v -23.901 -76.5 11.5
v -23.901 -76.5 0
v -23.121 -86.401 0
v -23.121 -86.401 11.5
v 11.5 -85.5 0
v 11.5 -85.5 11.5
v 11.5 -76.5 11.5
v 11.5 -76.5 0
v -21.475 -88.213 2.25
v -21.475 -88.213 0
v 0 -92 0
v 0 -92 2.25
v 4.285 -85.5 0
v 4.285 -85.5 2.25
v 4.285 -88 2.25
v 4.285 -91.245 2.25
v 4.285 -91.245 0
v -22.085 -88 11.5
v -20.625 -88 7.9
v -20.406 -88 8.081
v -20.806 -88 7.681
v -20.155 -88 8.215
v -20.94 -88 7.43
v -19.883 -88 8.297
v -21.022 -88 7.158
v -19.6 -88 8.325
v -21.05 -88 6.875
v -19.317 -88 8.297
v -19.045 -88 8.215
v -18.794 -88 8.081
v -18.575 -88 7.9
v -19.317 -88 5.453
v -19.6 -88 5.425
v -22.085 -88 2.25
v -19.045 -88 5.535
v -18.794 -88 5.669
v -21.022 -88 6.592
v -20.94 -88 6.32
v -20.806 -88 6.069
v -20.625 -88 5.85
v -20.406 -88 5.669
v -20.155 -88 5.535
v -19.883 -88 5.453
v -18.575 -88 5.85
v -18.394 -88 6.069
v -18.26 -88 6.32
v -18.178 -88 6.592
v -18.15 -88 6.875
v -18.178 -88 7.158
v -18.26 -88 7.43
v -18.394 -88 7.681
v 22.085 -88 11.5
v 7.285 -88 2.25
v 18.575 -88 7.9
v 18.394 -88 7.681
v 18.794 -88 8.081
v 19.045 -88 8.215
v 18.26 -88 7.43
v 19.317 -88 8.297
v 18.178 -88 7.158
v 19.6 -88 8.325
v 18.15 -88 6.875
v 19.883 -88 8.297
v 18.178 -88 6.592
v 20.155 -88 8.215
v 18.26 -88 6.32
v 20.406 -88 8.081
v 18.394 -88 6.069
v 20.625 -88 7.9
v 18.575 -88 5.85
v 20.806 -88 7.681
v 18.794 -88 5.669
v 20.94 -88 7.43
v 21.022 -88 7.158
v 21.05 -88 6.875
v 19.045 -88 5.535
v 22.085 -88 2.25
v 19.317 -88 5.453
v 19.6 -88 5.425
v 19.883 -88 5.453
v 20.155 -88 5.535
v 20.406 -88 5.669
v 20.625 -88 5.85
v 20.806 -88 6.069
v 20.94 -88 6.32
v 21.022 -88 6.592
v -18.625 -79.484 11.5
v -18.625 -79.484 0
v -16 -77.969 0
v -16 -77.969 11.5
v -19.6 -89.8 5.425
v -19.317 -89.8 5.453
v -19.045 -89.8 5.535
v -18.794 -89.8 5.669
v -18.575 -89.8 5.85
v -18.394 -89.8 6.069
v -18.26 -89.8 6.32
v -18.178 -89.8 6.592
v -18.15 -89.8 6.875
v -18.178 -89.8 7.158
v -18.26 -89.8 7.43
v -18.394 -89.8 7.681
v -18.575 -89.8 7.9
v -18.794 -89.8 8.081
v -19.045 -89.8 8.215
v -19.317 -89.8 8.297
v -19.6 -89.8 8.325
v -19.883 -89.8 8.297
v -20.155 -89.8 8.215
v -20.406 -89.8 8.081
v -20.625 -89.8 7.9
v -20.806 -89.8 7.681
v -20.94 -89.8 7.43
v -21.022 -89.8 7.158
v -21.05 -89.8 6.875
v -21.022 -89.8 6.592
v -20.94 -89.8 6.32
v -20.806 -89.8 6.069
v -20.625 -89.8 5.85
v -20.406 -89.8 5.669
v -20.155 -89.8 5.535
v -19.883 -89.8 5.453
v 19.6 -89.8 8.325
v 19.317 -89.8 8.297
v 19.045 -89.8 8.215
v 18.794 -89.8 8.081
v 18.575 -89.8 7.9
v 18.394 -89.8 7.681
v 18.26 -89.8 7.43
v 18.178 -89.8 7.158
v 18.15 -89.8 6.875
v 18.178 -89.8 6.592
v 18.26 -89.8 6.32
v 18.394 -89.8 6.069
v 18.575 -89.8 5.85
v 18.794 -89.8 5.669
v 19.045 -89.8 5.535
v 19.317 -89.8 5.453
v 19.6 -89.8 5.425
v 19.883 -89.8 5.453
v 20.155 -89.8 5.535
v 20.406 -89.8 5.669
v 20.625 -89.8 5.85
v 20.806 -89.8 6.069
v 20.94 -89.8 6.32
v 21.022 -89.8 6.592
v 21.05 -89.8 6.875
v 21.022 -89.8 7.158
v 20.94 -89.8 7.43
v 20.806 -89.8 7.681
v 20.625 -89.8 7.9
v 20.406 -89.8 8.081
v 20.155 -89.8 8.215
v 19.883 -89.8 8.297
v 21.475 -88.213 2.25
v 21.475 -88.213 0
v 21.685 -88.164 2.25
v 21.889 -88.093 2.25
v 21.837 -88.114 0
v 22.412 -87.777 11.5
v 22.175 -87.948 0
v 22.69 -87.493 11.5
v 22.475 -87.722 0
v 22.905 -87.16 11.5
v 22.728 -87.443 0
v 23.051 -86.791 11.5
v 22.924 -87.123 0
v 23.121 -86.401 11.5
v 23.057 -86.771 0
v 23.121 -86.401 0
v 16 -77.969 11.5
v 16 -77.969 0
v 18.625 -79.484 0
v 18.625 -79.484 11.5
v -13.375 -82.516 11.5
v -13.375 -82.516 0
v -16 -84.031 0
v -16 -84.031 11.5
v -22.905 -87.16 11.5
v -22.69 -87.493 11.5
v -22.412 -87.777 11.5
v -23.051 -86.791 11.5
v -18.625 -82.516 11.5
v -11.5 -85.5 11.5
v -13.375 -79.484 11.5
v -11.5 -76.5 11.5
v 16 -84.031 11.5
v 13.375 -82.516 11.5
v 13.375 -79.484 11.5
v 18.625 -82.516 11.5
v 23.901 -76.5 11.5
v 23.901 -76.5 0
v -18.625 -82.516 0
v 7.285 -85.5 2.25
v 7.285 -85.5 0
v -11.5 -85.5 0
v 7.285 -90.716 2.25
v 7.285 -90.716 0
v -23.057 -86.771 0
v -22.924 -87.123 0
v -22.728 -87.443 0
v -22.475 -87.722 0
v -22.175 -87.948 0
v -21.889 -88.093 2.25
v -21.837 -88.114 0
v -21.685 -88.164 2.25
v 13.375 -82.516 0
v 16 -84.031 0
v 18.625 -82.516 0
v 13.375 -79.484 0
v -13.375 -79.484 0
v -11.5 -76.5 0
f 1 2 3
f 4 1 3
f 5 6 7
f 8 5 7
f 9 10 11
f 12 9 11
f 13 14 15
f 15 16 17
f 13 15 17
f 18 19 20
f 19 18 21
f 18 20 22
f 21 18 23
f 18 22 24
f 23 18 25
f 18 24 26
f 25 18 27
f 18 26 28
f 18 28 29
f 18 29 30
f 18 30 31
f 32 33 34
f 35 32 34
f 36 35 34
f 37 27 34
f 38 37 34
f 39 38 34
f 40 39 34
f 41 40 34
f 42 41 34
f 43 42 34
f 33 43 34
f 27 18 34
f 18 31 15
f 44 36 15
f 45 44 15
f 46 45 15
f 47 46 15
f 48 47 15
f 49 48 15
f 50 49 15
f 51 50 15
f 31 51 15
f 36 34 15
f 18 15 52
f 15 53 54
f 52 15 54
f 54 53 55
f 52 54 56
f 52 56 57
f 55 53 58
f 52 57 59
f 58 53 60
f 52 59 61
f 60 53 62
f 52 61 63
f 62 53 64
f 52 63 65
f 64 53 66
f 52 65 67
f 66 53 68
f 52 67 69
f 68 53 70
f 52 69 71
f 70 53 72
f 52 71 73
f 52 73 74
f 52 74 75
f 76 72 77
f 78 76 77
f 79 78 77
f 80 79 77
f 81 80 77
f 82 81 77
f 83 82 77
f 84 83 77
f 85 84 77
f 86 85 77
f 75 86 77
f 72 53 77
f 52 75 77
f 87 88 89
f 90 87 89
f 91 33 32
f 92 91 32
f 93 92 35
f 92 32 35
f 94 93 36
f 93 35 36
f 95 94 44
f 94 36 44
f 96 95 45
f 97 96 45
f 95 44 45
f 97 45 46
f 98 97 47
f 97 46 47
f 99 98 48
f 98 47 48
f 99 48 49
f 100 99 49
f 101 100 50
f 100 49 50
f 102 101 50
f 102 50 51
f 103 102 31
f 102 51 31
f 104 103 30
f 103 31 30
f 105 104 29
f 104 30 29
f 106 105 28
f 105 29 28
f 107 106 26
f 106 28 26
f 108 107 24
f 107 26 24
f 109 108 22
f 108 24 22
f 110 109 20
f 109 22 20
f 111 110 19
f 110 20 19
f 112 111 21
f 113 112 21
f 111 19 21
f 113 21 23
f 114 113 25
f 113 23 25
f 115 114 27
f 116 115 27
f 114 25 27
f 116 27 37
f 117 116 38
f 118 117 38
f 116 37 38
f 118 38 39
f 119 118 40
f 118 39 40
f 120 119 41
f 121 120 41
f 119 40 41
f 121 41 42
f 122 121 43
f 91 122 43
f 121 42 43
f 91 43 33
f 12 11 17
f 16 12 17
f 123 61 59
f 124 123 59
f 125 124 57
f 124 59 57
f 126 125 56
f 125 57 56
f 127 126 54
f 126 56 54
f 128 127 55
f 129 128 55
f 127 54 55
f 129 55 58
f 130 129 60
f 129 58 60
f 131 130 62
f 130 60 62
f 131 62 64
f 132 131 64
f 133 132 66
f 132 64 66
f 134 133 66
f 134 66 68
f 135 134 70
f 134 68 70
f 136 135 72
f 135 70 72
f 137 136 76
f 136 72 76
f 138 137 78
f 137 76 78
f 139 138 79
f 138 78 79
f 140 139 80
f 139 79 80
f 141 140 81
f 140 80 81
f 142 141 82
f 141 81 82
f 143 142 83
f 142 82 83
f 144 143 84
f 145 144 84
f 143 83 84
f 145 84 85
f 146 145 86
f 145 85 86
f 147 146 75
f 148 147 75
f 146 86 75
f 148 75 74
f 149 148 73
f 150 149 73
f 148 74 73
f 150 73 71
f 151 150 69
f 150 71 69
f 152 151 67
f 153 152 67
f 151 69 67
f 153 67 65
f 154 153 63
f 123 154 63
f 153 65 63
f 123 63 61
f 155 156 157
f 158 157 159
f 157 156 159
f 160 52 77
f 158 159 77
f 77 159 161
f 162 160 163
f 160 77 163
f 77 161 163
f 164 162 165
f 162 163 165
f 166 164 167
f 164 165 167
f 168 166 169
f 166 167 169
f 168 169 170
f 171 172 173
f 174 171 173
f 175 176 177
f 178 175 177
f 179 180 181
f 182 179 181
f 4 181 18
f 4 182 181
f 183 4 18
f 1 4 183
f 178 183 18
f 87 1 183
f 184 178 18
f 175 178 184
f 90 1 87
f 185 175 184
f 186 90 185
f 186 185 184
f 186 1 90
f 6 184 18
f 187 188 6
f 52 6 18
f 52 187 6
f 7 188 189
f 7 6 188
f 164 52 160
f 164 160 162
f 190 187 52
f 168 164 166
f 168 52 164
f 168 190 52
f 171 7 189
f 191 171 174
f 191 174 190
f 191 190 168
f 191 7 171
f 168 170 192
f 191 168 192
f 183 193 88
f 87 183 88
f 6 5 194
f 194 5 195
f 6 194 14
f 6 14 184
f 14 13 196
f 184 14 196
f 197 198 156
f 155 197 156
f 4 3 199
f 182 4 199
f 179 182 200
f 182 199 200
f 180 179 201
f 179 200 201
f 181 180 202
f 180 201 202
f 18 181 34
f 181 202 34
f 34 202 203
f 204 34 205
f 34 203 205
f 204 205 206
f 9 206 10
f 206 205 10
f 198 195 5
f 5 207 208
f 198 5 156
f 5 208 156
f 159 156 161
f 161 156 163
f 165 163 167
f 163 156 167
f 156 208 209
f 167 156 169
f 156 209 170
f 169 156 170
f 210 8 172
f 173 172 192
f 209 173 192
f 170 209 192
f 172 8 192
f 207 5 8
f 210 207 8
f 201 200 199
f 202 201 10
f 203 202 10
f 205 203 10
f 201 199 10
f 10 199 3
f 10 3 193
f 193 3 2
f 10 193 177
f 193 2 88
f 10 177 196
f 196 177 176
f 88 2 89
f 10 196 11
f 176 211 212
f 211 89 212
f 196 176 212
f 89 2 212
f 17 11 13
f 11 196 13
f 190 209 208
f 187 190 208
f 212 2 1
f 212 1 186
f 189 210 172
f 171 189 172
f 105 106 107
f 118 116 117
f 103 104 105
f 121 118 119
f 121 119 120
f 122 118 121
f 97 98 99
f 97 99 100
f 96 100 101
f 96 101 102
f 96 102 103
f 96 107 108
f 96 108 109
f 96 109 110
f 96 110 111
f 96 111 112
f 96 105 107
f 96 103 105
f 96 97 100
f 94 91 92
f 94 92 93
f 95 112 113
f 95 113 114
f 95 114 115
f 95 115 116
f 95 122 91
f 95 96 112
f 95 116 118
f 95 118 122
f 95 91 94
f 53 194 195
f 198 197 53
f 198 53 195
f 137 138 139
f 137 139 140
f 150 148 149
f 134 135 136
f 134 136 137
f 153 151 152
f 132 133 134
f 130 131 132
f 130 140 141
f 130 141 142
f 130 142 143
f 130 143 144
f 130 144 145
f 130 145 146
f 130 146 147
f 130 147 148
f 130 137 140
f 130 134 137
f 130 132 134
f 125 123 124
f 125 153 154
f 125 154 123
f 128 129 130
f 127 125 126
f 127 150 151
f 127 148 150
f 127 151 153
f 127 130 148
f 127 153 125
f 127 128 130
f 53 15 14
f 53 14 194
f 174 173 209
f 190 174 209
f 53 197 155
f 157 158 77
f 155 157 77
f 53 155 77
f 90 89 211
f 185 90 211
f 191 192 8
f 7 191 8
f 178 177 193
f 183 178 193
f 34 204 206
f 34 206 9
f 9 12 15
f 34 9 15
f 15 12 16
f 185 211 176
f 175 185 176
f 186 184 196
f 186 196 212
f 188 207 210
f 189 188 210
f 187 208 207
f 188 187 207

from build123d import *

# Parameters (mm, degrees)
SKETCH1_W           = 9
SKETCH1_H           = 9
BOSS_EXTRUDE1_DEPTH = 11.5
SKETCH2_W           = 45.5
SKETCH2_H           = 9.25
CUT_EXTRUDE1_DEPTH  = 4
SKETCH3_R           = 1.45
BOSS_EXTRUDE2_DEPTH = 1.8
CUT_EXTRUDE2_REACH  = 32.72
SKETCH4_W           = 3
SKETCH4_H           = 2.25


with BuildPart() as part:
    # Sketch1 → Boss-Extrude1 (new body)
    # profile 1 of 4: a face of its own
    with BuildSketch(Plane.XY):
        with BuildLine():
            Line((-20.5, -76.5), (-23.900700066, -76.5))
            Line((-23.900700066, -76.5), (-23.121499045, -86.400687699))
            ThreePointArc((-23.121499045, -86.400687699), (-22.608100633, -87.588503122), (-21.474960733, -88.213385013))
            Line((-21.474960733, -88.213385013), (0, -92))
            Line((0, -92), (21.474960733, -88.213385013))
            ThreePointArc((21.474960733, -88.213385013), (22.608100633, -87.588503122), (23.121499045, -86.400687699))
            Line((23.121499045, -86.400687699), (23.900700066, -76.5))
            Line((23.900700066, -76.5), (20.5, -76.5))
            Line((20.5, -76.5), (20.5, -85.5))
            Line((20.5, -85.5), (11.5, -85.5))
            Line((11.5, -85.5), (-11.5, -85.5))
            Line((-11.5, -85.5), (-20.5, -85.5))
            Line((-20.5, -85.5), (-20.5, -76.5))
        make_face()
    # profile 2 of 4: a face of its own
    with BuildSketch(Plane.XY):
        with BuildLine():
            Line((-20.5, -76.5), (-23.900700066, -76.5))
            Line((-23.900700066, -76.5), (-23.121499045, -86.400687699))
            ThreePointArc((-23.121499045, -86.400687699), (-22.608100633, -87.588503122), (-21.474960733, -88.213385013))
            Line((-21.474960733, -88.213385013), (0, -92))
            Line((0, -92), (21.474960733, -88.213385013))
            ThreePointArc((21.474960733, -88.213385013), (22.608100633, -87.588503122), (23.121499045, -86.400687699))
            Line((23.121499045, -86.400687699), (23.900700066, -76.5))
            Line((23.900700066, -76.5), (20.5, -76.5))
            Line((20.5, -76.5), (20.5, -85.5))
            Line((20.5, -85.5), (11.5, -85.5))
            Line((11.5, -85.5), (-11.5, -85.5))
            Line((-11.5, -85.5), (-20.5, -85.5))
            Line((-20.5, -85.5), (-20.5, -76.5))
        make_face()
    # profile 3 of 4: a face of its own
    with BuildSketch(Plane.XY):
        with Locations((16, -81)):
            Rectangle(SKETCH1_W, SKETCH1_H)
        Polygon((18.625, -82.515544457), (16, -84.031088913), (13.375, -82.515544457), (13.375, -79.484455543), (16, -77.968911087), (18.625, -79.484455543), align=None, mode=Mode.SUBTRACT)
    # profile 4 of 4: a face of its own
    with BuildSketch(Plane.XY):
        with Locations((-16, -81)):
            Rectangle(SKETCH1_W, SKETCH1_H)
        Polygon((-13.375, -82.515544457), (-16, -84.031088913), (-18.625, -82.515544457), (-18.625, -79.484455543), (-16, -77.968911087), (-13.375, -79.484455543), align=None, mode=Mode.SUBTRACT)
    extrude(amount=BOSS_EXTRUDE1_DEPTH)

    # Sketch2 → Cut-Extrude1 (cut)
    with BuildSketch(Plane(origin=(0, -92, 0), x_dir=(1, 0, 0), z_dir=(0, 1, 0))):
        with Locations((0, -6.875)):
            Rectangle(SKETCH2_W, SKETCH2_H)
    extrude(amount=CUT_EXTRUDE1_DEPTH, mode=Mode.SUBTRACT)

    # Sketch3 → Boss-Extrude2 (add)
    with BuildSketch(Plane.XZ.offset(88)):
        with Locations(Location((-19.6, 6.875, 0), (0, 0, 270))):
            Circle(SKETCH3_R)
        with Locations(Location((19.6, 6.875, 0), (0, 0, 90))):
            Circle(SKETCH3_R)
    extrude(amount=BOSS_EXTRUDE2_DEPTH)

    # Sketch4 → Cut-Extrude2 (cut, up to next)
    with BuildSketch(Plane(origin=(0, -92, 0), x_dir=(1, 0, 0), z_dir=(0, 1, 0)), mode=Mode.PRIVATE) as cut_extrude2_sk1:
        with Locations((5.78456273, -1.125)):
            Rectangle(SKETCH4_W, SKETCH4_H)
    cut_extrude2_tool1 = extrude(cut_extrude2_sk1.sketch, amount=CUT_EXTRUDE2_REACH, mode=Mode.PRIVATE) & part.part
    add(cut_extrude2_tool1.solids().sort_by_distance((5.784563, -92, 1.125))[0], mode=Mode.SUBTRACT)


solid = part.part
